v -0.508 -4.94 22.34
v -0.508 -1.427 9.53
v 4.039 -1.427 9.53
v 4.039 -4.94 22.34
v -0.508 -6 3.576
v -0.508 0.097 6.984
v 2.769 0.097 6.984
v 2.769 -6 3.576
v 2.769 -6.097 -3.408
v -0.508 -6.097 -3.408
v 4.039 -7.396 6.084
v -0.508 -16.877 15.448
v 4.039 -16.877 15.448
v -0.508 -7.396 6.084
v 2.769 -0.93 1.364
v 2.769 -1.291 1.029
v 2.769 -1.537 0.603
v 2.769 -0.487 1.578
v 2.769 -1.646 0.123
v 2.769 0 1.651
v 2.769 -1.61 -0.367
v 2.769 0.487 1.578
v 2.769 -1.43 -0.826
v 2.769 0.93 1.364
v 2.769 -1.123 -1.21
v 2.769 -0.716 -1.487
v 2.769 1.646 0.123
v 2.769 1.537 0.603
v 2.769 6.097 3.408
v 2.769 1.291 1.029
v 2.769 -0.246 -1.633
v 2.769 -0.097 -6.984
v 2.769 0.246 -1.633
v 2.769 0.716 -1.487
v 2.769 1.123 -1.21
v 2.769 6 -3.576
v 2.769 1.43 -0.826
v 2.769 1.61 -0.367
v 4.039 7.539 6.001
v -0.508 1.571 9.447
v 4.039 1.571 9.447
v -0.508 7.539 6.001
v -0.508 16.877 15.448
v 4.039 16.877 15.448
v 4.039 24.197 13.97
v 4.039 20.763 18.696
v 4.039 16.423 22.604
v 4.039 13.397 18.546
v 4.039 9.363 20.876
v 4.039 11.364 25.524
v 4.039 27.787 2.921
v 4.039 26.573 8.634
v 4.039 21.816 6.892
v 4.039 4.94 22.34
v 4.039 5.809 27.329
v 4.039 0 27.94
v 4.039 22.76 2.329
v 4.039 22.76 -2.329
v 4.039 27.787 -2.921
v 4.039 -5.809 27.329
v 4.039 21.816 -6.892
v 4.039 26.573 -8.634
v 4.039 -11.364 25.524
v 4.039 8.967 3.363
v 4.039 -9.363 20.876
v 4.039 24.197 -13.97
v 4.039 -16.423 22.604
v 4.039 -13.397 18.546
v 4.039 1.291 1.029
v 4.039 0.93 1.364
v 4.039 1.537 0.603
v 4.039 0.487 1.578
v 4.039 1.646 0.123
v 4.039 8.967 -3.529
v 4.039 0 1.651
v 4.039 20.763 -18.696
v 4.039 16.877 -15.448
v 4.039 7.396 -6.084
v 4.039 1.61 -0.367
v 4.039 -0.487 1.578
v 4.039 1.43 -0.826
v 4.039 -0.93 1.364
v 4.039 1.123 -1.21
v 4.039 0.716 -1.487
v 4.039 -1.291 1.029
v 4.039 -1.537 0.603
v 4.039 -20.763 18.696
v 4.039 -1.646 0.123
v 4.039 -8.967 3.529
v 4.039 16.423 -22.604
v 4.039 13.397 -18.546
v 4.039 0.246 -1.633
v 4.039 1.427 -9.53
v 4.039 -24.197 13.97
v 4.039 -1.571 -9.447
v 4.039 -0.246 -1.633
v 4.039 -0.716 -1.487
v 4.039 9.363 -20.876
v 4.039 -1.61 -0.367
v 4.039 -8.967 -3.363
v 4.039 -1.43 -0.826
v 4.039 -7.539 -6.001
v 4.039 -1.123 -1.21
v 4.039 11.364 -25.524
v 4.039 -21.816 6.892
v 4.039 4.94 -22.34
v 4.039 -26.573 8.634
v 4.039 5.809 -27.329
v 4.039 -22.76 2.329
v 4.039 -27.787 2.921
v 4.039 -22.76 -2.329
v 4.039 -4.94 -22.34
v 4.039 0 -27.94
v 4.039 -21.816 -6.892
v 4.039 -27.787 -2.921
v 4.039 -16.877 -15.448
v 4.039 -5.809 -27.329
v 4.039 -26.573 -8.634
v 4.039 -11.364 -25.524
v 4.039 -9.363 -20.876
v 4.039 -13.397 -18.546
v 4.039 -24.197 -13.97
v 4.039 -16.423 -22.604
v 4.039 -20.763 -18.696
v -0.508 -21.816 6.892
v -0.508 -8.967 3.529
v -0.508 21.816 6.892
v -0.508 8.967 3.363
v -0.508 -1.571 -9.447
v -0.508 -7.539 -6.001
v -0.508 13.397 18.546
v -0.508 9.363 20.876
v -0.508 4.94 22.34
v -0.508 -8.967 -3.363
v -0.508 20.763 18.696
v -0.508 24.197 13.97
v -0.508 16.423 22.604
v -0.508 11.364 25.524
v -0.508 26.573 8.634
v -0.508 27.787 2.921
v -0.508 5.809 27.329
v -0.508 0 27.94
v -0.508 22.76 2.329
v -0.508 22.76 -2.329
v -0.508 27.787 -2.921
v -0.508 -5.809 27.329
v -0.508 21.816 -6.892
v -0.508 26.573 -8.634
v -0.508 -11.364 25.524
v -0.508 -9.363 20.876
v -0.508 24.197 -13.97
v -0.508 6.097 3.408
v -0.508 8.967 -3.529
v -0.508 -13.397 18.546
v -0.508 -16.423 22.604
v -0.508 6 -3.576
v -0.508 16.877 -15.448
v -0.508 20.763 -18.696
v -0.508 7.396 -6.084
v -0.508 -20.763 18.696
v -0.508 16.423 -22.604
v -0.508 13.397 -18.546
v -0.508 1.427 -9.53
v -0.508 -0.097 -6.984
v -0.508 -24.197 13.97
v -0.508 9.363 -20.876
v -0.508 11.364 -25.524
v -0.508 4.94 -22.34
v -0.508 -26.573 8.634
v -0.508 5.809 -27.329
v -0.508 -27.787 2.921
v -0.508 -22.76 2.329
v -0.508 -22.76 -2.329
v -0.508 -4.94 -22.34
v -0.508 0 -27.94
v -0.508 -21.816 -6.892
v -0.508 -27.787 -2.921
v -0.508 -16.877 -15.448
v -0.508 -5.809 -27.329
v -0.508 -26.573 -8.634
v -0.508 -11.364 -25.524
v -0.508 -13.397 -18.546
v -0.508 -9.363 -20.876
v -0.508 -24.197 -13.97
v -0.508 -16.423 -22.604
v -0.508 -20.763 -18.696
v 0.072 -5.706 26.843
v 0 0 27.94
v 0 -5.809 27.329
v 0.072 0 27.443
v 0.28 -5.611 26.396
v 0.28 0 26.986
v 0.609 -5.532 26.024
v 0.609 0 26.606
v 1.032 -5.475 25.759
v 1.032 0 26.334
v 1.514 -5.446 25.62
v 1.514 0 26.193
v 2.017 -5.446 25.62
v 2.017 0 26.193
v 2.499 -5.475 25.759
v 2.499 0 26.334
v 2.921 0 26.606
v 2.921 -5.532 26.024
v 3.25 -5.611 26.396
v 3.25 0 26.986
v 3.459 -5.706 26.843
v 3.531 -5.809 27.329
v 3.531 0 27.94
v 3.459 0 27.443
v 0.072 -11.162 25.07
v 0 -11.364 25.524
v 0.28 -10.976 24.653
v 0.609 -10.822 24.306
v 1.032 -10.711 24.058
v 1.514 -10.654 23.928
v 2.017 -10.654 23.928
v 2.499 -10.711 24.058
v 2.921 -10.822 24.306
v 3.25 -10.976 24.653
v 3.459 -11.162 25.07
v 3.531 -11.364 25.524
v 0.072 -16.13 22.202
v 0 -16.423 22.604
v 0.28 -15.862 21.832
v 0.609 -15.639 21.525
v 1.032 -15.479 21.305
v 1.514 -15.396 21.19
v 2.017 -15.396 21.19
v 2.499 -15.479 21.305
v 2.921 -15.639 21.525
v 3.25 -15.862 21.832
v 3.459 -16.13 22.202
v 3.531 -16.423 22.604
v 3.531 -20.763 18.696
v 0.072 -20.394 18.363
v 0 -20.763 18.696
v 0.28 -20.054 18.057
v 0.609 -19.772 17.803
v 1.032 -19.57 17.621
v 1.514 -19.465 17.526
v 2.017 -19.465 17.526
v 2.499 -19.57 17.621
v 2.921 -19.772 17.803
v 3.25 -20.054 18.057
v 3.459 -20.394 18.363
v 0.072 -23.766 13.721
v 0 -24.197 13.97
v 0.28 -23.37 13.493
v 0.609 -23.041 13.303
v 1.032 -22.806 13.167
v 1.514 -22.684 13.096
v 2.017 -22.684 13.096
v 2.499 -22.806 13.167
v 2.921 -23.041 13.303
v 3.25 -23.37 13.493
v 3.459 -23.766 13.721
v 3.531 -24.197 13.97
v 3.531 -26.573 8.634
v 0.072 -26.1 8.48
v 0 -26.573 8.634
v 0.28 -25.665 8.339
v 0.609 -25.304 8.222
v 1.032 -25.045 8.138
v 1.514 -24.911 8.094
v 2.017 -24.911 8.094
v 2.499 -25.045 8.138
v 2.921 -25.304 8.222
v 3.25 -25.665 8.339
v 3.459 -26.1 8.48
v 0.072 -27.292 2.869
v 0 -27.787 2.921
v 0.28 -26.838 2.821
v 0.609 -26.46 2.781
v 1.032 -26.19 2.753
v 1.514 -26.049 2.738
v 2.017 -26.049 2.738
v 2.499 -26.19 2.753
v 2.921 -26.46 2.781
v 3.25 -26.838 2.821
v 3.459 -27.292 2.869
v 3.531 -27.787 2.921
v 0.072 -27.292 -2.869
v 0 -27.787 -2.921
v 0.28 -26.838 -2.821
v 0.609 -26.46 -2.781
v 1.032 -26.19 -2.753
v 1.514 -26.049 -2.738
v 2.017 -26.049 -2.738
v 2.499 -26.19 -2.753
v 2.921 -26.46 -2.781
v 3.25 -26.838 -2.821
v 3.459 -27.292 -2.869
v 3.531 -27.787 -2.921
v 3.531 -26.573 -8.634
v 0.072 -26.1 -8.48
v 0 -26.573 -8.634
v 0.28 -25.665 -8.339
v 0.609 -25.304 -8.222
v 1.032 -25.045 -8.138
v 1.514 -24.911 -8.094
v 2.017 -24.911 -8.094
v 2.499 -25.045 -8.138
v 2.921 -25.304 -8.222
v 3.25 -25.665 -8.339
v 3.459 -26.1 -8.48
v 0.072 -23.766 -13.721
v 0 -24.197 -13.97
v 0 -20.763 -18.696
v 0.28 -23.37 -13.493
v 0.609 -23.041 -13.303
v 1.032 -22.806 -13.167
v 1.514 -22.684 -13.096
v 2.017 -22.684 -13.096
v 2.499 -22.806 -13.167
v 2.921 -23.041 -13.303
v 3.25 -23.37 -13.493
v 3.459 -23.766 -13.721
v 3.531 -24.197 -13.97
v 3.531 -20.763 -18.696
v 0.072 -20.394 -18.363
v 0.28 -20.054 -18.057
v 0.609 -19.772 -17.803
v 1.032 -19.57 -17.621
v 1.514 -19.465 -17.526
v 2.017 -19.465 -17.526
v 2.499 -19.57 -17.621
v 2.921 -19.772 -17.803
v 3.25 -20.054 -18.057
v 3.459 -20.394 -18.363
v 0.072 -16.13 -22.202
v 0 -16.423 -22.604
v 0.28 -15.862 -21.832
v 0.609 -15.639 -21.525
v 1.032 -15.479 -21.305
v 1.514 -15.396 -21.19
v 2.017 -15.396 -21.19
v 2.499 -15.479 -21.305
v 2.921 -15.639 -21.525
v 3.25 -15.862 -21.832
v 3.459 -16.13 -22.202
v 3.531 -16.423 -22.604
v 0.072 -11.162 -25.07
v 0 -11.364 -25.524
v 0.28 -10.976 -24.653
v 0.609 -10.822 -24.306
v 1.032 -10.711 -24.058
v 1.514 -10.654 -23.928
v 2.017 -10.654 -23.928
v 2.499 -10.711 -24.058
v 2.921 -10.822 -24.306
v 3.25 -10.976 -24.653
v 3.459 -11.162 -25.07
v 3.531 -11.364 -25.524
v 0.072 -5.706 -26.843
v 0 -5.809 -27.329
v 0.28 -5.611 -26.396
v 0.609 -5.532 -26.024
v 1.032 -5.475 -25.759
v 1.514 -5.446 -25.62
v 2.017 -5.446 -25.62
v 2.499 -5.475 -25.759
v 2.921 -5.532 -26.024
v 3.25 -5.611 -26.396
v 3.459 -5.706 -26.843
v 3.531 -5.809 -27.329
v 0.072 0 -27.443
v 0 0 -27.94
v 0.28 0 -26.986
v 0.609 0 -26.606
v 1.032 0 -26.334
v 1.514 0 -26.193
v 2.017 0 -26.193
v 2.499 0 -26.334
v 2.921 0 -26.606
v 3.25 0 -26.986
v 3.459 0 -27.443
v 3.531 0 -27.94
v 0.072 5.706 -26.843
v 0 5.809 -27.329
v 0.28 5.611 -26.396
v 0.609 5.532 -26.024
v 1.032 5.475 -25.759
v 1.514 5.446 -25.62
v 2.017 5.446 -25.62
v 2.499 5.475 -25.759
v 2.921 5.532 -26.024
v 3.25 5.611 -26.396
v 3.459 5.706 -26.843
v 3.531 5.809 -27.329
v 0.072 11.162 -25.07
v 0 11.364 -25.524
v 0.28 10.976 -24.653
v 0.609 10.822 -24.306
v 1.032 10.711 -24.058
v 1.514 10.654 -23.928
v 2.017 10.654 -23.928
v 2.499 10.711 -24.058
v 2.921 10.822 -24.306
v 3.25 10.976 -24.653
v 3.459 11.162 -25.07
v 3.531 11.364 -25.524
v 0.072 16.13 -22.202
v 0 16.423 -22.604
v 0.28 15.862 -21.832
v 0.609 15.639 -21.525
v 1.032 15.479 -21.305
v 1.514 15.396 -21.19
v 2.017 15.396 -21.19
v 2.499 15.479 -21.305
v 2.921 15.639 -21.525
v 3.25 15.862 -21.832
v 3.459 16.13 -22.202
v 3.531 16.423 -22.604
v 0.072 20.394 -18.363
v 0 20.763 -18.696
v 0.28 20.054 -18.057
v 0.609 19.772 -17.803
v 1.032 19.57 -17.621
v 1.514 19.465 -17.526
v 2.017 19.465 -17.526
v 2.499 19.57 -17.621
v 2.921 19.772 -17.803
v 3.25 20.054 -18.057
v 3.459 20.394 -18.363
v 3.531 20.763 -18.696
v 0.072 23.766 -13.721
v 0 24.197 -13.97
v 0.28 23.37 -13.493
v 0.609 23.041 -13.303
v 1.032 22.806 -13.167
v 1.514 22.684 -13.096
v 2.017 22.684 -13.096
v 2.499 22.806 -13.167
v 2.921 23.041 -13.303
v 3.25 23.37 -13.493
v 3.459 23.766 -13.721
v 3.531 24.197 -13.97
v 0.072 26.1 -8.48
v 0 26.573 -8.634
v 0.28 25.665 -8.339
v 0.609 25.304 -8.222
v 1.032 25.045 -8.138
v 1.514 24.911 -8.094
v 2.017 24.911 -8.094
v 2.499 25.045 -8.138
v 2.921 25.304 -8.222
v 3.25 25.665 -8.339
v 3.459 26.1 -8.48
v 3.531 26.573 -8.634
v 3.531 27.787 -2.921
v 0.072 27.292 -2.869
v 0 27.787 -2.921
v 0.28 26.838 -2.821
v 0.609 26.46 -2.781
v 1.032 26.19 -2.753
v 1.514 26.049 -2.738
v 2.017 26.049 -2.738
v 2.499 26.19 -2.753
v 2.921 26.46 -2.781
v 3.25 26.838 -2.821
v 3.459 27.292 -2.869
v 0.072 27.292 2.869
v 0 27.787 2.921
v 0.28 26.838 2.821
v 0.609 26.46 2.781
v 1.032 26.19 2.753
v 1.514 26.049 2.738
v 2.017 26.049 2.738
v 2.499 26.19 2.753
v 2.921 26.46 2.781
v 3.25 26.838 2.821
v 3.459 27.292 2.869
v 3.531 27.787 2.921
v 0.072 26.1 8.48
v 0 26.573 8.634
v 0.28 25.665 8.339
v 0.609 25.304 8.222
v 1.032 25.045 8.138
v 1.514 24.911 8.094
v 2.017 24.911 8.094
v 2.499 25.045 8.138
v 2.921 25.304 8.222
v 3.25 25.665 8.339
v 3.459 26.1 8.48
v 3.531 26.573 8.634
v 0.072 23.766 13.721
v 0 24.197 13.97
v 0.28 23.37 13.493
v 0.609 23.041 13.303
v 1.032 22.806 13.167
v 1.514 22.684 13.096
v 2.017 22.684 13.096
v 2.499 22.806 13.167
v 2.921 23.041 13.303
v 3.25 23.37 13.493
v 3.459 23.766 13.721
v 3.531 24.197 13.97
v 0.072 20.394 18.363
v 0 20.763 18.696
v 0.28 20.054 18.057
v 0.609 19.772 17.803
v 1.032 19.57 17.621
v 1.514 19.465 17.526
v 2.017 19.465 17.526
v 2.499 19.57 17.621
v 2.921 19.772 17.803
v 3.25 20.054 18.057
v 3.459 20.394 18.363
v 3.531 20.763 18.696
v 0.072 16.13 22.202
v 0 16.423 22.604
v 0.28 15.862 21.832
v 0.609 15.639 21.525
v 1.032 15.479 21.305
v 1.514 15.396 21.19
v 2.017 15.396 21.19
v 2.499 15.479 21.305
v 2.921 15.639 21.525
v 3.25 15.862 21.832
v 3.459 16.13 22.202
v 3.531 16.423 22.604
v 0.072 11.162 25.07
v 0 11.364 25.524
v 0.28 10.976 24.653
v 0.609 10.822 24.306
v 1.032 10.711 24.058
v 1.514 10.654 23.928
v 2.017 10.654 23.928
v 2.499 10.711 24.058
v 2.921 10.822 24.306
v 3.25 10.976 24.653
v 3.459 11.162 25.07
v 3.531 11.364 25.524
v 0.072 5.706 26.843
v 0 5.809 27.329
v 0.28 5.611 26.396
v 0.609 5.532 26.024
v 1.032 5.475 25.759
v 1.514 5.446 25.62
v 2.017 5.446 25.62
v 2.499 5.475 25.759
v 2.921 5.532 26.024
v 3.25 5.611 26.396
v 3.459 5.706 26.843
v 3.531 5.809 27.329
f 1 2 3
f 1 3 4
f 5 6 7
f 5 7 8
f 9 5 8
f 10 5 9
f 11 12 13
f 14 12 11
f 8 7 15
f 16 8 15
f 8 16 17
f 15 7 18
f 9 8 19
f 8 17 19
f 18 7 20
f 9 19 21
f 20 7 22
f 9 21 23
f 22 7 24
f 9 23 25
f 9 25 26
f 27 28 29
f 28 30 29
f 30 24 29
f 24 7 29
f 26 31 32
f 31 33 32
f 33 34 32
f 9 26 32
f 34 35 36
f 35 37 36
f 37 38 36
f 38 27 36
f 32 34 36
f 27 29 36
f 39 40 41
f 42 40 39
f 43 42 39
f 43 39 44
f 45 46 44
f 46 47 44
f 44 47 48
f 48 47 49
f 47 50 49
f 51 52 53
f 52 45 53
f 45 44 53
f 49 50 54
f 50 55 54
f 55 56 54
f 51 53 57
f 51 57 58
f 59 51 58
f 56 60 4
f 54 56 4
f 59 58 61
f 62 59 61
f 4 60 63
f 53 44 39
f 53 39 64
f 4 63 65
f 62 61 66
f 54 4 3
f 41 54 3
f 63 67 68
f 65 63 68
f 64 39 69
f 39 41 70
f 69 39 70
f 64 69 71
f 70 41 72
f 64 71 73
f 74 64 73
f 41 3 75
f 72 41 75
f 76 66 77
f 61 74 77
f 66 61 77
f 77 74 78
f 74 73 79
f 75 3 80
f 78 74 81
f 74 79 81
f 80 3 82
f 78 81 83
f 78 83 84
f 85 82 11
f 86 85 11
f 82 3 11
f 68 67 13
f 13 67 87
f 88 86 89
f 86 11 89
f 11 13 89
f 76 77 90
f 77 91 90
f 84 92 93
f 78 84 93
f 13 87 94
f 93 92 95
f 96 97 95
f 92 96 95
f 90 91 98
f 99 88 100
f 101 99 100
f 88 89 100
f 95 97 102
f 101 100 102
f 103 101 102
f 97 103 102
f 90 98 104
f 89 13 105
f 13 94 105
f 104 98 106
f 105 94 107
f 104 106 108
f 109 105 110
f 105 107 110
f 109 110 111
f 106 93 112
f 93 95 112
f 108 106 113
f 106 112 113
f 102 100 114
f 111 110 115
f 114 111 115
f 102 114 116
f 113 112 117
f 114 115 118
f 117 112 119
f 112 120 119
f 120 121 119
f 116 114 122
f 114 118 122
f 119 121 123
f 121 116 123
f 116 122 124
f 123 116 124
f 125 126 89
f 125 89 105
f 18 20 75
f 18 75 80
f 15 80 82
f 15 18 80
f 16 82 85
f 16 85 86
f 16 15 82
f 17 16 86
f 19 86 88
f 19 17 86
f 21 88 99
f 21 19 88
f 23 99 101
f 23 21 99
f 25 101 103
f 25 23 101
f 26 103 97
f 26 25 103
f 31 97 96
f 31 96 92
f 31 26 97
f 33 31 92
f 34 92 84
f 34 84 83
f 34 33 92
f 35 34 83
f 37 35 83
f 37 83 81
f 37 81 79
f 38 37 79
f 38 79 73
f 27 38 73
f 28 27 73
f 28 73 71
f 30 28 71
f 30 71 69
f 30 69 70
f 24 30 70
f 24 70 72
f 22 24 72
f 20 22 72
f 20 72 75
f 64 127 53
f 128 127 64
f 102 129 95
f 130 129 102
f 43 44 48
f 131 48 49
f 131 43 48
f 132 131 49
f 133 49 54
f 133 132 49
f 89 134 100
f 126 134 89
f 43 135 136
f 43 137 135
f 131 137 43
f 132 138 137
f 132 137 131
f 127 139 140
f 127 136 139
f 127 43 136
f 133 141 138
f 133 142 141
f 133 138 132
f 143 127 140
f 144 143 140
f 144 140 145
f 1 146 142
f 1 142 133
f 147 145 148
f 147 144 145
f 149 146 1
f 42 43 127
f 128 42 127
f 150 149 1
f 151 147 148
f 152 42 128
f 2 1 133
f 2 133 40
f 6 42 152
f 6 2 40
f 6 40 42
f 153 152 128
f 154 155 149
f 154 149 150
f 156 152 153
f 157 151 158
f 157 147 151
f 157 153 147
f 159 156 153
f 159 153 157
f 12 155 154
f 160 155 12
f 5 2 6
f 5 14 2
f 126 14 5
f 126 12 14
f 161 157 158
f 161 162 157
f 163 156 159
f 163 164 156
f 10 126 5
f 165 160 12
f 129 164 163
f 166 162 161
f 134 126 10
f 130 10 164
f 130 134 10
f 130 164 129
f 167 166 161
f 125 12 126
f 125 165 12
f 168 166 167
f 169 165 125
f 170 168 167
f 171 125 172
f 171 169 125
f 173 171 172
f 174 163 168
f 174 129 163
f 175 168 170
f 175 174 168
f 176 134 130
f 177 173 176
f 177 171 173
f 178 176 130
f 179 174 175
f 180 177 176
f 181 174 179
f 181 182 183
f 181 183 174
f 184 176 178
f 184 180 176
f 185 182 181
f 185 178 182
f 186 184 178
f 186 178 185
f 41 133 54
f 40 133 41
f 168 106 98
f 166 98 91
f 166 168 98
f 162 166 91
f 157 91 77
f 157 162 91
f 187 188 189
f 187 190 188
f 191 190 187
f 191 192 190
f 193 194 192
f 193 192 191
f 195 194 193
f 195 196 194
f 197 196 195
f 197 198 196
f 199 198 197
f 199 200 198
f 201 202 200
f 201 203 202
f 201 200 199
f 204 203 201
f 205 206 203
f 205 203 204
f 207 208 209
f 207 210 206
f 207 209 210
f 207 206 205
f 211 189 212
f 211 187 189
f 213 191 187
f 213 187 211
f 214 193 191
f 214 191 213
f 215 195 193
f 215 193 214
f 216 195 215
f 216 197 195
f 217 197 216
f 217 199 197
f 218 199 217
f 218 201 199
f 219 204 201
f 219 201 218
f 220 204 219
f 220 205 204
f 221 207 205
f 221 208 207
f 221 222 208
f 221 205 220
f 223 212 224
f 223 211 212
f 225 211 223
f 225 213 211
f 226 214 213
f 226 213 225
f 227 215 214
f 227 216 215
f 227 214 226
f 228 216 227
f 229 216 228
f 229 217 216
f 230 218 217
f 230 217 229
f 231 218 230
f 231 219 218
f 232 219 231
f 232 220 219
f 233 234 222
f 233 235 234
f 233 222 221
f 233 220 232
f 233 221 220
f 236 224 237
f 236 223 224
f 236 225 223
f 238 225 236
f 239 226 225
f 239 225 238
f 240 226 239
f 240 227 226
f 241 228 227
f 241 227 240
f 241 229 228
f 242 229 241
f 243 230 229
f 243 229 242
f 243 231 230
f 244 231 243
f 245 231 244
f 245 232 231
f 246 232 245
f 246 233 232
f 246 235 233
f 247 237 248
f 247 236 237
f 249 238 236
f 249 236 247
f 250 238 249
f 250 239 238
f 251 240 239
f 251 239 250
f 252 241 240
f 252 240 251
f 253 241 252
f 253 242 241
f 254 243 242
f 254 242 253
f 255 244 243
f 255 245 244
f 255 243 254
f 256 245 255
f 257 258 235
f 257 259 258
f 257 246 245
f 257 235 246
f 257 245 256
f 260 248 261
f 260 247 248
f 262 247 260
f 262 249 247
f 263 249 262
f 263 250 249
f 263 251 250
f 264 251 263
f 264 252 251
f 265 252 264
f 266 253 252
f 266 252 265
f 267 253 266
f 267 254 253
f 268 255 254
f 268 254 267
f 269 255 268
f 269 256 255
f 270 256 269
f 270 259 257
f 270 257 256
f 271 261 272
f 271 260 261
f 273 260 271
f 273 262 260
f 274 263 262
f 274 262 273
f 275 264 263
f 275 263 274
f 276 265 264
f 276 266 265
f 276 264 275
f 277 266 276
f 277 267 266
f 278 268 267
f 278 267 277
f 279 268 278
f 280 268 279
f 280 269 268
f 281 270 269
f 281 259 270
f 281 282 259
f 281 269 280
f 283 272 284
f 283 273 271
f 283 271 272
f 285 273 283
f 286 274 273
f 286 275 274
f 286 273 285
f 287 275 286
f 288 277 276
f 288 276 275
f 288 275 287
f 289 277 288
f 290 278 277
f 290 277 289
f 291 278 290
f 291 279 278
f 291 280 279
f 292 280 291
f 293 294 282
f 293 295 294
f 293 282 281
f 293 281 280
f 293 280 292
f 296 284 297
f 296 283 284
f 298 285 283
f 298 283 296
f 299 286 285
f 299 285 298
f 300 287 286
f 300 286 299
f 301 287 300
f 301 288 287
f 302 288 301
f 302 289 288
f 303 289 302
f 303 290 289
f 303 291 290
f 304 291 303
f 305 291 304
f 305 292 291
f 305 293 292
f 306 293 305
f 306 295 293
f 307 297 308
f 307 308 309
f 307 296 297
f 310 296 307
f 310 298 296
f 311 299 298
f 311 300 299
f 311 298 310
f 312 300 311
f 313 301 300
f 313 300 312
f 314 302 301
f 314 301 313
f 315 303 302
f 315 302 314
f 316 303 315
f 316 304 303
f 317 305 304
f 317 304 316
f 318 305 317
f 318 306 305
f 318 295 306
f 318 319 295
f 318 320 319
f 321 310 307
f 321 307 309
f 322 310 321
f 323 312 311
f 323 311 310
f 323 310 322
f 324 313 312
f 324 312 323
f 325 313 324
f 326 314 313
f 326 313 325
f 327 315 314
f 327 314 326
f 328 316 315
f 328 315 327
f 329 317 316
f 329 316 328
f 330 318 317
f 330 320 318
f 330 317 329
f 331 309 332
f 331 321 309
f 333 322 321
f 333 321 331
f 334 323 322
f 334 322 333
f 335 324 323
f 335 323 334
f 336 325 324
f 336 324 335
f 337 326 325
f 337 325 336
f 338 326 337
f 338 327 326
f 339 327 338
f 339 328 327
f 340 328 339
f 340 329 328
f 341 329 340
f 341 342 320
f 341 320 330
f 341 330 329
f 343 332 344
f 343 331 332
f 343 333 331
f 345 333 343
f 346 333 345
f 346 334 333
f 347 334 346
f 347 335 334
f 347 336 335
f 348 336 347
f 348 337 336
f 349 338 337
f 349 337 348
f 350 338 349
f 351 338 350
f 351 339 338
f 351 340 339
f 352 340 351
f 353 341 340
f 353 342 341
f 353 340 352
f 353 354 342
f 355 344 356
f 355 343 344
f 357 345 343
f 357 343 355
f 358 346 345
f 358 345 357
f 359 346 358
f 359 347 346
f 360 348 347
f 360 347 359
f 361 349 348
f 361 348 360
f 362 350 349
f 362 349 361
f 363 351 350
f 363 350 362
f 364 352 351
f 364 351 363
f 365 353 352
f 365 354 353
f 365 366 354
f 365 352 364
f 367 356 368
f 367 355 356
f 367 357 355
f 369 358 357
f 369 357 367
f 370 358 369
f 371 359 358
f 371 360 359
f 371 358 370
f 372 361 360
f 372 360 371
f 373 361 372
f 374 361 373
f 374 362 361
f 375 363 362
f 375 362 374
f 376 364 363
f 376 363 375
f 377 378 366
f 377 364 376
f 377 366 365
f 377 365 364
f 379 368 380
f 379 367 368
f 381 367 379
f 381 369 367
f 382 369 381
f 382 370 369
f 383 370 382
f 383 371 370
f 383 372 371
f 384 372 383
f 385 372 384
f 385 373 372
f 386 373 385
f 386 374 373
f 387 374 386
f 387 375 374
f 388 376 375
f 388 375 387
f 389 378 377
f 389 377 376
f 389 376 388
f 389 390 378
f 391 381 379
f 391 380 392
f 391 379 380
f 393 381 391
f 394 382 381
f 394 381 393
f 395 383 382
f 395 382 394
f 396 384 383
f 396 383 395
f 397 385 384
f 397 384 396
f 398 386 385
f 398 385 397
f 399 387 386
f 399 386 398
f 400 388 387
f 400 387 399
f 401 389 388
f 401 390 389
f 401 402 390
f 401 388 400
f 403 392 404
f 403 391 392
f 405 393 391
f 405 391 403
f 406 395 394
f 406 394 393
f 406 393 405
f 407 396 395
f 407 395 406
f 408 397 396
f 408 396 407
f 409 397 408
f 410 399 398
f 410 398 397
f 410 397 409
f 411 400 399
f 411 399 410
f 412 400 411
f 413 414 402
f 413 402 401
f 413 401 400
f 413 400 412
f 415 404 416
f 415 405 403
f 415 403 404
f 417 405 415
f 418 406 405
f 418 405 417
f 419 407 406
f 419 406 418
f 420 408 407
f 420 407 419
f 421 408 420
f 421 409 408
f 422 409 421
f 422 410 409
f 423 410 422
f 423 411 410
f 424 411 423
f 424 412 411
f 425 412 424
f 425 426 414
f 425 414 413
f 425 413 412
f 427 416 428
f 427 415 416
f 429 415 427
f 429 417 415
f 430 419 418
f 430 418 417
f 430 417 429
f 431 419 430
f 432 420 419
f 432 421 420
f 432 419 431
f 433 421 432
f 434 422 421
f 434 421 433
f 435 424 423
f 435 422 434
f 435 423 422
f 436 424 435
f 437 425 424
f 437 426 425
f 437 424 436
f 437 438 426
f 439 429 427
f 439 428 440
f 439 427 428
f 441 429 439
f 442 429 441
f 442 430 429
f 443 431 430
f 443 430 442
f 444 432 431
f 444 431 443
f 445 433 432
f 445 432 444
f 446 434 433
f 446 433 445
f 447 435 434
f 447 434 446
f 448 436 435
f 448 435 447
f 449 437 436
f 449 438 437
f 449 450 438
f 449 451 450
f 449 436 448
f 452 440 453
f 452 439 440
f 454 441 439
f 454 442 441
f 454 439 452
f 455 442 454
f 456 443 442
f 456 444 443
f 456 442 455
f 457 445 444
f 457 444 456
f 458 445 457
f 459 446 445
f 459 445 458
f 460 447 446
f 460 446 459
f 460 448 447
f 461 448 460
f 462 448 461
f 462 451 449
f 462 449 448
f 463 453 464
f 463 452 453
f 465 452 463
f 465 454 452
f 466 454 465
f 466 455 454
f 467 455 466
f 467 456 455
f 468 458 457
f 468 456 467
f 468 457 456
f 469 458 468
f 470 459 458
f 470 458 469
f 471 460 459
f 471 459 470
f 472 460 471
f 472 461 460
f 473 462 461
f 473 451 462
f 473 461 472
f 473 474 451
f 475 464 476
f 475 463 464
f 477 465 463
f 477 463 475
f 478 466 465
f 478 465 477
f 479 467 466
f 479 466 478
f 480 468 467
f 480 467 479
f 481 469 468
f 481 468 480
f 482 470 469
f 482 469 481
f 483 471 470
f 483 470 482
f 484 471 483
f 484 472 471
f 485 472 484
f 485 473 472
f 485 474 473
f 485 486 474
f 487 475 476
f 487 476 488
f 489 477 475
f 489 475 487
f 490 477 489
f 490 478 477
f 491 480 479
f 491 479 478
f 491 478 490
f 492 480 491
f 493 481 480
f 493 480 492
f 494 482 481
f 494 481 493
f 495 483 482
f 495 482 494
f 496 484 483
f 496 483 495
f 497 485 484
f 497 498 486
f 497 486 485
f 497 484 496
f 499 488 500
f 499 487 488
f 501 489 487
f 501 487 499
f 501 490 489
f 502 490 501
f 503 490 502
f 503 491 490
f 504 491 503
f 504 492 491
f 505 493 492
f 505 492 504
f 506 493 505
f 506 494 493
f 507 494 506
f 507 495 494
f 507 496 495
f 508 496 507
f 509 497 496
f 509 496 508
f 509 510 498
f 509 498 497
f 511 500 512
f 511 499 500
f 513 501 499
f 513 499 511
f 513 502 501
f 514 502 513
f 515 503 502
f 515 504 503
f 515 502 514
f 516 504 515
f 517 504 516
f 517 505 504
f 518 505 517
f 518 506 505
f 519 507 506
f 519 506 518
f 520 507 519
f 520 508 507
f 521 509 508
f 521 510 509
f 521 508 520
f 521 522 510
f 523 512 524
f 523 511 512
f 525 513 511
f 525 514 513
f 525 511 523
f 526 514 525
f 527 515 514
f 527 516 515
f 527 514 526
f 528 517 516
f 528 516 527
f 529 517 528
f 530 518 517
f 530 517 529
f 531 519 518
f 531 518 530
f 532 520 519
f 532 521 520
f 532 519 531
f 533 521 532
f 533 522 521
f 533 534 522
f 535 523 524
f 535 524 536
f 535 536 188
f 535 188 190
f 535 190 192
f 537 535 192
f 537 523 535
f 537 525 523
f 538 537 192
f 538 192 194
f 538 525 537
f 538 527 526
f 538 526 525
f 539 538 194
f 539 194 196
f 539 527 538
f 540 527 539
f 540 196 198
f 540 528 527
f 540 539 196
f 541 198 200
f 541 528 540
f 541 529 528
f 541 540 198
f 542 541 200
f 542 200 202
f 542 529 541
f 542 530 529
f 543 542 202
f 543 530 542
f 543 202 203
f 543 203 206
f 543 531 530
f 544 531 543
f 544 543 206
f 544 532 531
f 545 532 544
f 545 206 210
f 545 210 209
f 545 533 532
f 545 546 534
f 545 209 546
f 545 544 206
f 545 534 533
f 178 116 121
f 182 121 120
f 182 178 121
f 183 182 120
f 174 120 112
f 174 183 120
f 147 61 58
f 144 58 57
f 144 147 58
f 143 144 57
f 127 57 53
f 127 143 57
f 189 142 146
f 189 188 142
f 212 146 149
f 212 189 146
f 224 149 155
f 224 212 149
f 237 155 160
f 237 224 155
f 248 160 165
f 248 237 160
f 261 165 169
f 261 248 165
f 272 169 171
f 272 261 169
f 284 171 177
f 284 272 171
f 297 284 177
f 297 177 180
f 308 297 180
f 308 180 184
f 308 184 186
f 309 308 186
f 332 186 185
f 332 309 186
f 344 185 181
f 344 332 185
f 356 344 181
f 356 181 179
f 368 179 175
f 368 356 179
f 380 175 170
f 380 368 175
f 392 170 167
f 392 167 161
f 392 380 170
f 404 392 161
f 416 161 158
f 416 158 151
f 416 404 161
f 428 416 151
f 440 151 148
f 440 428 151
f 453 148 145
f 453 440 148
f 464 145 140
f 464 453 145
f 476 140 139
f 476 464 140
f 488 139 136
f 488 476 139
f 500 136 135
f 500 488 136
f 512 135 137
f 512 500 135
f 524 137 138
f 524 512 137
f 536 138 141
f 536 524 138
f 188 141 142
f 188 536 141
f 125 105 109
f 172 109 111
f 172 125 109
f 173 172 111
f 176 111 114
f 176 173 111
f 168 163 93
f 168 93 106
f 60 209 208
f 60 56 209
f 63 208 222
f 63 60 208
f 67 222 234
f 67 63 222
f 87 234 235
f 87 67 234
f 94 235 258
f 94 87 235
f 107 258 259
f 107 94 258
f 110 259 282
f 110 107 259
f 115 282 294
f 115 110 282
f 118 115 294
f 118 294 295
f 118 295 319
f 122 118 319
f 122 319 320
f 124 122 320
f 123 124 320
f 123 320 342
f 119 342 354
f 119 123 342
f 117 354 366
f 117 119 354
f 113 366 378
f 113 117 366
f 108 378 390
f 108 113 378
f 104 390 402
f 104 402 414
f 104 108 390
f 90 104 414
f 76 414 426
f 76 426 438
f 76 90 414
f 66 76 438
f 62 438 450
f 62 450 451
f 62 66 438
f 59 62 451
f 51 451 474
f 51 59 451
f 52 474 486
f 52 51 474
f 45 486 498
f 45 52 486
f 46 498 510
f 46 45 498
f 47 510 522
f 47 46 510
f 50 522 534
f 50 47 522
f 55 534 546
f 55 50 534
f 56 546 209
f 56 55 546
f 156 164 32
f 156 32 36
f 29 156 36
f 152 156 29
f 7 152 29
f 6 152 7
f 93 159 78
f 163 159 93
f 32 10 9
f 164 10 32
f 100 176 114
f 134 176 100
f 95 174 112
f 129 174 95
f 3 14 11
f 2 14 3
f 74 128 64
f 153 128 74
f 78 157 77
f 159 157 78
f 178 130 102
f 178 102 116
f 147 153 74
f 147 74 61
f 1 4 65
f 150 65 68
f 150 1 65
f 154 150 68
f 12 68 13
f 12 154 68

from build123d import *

# Parameters (mm, degrees)
SKETCH2_W          = 0.508
SKETCH2_H          = 27.94
CUT_EXTRUDE1_REACH = 41.774
SKETCH3_R          = 1.651
CIRPATTERN1_COUNT  = 6
SKETCH3_3_R        = 1.651
CUT_EXTRUDE2_DEPTH = 3.2766


with BuildPart() as part:
    # Sketch2 → Revolve1 (revolve)
    with BuildSketch(Plane.XY, mode=Mode.PRIVATE) as revolve1_sk:
        with Locations((-0.254, 13.97)):
            Rectangle(SKETCH2_W, SKETCH2_H)
        with BuildLine():
            ThreePointArc((0, 27.94), (1.7653, 26.1747), (3.5306, 27.94))
            Line((3.5306, 27.94), (3.5306, 0))
            Line((3.5306, 0), (0, 0))
            Line((0, 0), (0, 27.94))
        make_face()
        with Locations((3.7846, 13.97)):
            Rectangle(SKETCH2_W, SKETCH2_H)
    revolve(revolve1_sk.sketch.rotate(Axis((0, 0, 0), (1, 0, 0)), 90), axis=Axis((0, 0, 0), (1, 0, 0)))

    # Sketch3 → Cut-Extrude1 (cut, up to next)
    with BuildSketch(Plane(origin=(-0.508, 0, 0), x_dir=(0, 0, -1), z_dir=(1, 0, 0)), mode=Mode.PRIVATE) as cut_extrude1_sk1:
        with BuildLine():
            ThreePointArc((6.891742224, 21.816499024), (0, 22.879155153), (-6.891742224, 21.816499024))
            Line((-6.891742224, 21.816499024), (-3.362938361, 8.966871047))
            Line((-3.362938361, 8.966871047), (3.528803863, 8.966871047))
            Line((3.528803863, 8.966871047), (6.891742224, 21.816499024))
        make_face()
    cut_extrude1_tool1 = extrude(cut_extrude1_sk1.sketch, amount=CUT_EXTRUDE1_REACH, mode=Mode.PRIVATE) & part.part
    # Sketch3 → Cut-Extrude1 (cut, up to next)
    with BuildSketch(Plane(origin=(-0.508, 0, 0), x_dir=(0, 0, -1), z_dir=(1, 0, 0)), mode=Mode.PRIVATE) as cut_extrude1_sk2:
        with Locations(Location((0, 0, 0), (0, 0, 180))):
            Circle(SKETCH3_R)
    cut_extrude1_tool2 = extrude(cut_extrude1_sk2.sketch, amount=CUT_EXTRUDE1_REACH, mode=Mode.PRIVATE) & part.part
    cut_extrude1_1 = cut_extrude1_tool1.solids().sort_by_distance((-0.508, 16.527641, -0.034324))[0]
    add(cut_extrude1_1, mode=Mode.SUBTRACT)
    cut_extrude1_2 = cut_extrude1_tool2.solids().sort_by_distance((-0.508, 0, 0))[0]
    add(cut_extrude1_2, mode=Mode.SUBTRACT)
    cut_extrude1 = cut_extrude1_1 + cut_extrude1_2  # Cut-Extrude1 as one shape, for the pattern or mirror that repeats it

    # CirPattern1: Cut-Extrude1 ×6 about axis
    cirpattern1_axis = Axis((0, 0, 0), (1, 0, 0))
    for i in range(1, CIRPATTERN1_COUNT):
        add(cut_extrude1.rotate(cirpattern1_axis, i * 360 / CIRPATTERN1_COUNT), mode=Mode.SUBTRACT)

    # Sketch3<3> → Cut-Extrude2 (cut)
    with BuildSketch(Plane(origin=(-0.508, 0, 0), x_dir=(0, 0, -1), z_dir=(1, 0, 0))):
        Polygon((6.984325773, -0.097048964), (3.576209755, 6.000079065), (-3.408116018, 6.09712803), (-6.984325773, 0.097048964), (-3.576209755, -6.000079065), (3.408116018, -6.09712803), align=None)
        Circle(SKETCH3_3_R, mode=Mode.SUBTRACT)
    extrude(amount=CUT_EXTRUDE2_DEPTH, mode=Mode.SUBTRACT)


solid = part.part
